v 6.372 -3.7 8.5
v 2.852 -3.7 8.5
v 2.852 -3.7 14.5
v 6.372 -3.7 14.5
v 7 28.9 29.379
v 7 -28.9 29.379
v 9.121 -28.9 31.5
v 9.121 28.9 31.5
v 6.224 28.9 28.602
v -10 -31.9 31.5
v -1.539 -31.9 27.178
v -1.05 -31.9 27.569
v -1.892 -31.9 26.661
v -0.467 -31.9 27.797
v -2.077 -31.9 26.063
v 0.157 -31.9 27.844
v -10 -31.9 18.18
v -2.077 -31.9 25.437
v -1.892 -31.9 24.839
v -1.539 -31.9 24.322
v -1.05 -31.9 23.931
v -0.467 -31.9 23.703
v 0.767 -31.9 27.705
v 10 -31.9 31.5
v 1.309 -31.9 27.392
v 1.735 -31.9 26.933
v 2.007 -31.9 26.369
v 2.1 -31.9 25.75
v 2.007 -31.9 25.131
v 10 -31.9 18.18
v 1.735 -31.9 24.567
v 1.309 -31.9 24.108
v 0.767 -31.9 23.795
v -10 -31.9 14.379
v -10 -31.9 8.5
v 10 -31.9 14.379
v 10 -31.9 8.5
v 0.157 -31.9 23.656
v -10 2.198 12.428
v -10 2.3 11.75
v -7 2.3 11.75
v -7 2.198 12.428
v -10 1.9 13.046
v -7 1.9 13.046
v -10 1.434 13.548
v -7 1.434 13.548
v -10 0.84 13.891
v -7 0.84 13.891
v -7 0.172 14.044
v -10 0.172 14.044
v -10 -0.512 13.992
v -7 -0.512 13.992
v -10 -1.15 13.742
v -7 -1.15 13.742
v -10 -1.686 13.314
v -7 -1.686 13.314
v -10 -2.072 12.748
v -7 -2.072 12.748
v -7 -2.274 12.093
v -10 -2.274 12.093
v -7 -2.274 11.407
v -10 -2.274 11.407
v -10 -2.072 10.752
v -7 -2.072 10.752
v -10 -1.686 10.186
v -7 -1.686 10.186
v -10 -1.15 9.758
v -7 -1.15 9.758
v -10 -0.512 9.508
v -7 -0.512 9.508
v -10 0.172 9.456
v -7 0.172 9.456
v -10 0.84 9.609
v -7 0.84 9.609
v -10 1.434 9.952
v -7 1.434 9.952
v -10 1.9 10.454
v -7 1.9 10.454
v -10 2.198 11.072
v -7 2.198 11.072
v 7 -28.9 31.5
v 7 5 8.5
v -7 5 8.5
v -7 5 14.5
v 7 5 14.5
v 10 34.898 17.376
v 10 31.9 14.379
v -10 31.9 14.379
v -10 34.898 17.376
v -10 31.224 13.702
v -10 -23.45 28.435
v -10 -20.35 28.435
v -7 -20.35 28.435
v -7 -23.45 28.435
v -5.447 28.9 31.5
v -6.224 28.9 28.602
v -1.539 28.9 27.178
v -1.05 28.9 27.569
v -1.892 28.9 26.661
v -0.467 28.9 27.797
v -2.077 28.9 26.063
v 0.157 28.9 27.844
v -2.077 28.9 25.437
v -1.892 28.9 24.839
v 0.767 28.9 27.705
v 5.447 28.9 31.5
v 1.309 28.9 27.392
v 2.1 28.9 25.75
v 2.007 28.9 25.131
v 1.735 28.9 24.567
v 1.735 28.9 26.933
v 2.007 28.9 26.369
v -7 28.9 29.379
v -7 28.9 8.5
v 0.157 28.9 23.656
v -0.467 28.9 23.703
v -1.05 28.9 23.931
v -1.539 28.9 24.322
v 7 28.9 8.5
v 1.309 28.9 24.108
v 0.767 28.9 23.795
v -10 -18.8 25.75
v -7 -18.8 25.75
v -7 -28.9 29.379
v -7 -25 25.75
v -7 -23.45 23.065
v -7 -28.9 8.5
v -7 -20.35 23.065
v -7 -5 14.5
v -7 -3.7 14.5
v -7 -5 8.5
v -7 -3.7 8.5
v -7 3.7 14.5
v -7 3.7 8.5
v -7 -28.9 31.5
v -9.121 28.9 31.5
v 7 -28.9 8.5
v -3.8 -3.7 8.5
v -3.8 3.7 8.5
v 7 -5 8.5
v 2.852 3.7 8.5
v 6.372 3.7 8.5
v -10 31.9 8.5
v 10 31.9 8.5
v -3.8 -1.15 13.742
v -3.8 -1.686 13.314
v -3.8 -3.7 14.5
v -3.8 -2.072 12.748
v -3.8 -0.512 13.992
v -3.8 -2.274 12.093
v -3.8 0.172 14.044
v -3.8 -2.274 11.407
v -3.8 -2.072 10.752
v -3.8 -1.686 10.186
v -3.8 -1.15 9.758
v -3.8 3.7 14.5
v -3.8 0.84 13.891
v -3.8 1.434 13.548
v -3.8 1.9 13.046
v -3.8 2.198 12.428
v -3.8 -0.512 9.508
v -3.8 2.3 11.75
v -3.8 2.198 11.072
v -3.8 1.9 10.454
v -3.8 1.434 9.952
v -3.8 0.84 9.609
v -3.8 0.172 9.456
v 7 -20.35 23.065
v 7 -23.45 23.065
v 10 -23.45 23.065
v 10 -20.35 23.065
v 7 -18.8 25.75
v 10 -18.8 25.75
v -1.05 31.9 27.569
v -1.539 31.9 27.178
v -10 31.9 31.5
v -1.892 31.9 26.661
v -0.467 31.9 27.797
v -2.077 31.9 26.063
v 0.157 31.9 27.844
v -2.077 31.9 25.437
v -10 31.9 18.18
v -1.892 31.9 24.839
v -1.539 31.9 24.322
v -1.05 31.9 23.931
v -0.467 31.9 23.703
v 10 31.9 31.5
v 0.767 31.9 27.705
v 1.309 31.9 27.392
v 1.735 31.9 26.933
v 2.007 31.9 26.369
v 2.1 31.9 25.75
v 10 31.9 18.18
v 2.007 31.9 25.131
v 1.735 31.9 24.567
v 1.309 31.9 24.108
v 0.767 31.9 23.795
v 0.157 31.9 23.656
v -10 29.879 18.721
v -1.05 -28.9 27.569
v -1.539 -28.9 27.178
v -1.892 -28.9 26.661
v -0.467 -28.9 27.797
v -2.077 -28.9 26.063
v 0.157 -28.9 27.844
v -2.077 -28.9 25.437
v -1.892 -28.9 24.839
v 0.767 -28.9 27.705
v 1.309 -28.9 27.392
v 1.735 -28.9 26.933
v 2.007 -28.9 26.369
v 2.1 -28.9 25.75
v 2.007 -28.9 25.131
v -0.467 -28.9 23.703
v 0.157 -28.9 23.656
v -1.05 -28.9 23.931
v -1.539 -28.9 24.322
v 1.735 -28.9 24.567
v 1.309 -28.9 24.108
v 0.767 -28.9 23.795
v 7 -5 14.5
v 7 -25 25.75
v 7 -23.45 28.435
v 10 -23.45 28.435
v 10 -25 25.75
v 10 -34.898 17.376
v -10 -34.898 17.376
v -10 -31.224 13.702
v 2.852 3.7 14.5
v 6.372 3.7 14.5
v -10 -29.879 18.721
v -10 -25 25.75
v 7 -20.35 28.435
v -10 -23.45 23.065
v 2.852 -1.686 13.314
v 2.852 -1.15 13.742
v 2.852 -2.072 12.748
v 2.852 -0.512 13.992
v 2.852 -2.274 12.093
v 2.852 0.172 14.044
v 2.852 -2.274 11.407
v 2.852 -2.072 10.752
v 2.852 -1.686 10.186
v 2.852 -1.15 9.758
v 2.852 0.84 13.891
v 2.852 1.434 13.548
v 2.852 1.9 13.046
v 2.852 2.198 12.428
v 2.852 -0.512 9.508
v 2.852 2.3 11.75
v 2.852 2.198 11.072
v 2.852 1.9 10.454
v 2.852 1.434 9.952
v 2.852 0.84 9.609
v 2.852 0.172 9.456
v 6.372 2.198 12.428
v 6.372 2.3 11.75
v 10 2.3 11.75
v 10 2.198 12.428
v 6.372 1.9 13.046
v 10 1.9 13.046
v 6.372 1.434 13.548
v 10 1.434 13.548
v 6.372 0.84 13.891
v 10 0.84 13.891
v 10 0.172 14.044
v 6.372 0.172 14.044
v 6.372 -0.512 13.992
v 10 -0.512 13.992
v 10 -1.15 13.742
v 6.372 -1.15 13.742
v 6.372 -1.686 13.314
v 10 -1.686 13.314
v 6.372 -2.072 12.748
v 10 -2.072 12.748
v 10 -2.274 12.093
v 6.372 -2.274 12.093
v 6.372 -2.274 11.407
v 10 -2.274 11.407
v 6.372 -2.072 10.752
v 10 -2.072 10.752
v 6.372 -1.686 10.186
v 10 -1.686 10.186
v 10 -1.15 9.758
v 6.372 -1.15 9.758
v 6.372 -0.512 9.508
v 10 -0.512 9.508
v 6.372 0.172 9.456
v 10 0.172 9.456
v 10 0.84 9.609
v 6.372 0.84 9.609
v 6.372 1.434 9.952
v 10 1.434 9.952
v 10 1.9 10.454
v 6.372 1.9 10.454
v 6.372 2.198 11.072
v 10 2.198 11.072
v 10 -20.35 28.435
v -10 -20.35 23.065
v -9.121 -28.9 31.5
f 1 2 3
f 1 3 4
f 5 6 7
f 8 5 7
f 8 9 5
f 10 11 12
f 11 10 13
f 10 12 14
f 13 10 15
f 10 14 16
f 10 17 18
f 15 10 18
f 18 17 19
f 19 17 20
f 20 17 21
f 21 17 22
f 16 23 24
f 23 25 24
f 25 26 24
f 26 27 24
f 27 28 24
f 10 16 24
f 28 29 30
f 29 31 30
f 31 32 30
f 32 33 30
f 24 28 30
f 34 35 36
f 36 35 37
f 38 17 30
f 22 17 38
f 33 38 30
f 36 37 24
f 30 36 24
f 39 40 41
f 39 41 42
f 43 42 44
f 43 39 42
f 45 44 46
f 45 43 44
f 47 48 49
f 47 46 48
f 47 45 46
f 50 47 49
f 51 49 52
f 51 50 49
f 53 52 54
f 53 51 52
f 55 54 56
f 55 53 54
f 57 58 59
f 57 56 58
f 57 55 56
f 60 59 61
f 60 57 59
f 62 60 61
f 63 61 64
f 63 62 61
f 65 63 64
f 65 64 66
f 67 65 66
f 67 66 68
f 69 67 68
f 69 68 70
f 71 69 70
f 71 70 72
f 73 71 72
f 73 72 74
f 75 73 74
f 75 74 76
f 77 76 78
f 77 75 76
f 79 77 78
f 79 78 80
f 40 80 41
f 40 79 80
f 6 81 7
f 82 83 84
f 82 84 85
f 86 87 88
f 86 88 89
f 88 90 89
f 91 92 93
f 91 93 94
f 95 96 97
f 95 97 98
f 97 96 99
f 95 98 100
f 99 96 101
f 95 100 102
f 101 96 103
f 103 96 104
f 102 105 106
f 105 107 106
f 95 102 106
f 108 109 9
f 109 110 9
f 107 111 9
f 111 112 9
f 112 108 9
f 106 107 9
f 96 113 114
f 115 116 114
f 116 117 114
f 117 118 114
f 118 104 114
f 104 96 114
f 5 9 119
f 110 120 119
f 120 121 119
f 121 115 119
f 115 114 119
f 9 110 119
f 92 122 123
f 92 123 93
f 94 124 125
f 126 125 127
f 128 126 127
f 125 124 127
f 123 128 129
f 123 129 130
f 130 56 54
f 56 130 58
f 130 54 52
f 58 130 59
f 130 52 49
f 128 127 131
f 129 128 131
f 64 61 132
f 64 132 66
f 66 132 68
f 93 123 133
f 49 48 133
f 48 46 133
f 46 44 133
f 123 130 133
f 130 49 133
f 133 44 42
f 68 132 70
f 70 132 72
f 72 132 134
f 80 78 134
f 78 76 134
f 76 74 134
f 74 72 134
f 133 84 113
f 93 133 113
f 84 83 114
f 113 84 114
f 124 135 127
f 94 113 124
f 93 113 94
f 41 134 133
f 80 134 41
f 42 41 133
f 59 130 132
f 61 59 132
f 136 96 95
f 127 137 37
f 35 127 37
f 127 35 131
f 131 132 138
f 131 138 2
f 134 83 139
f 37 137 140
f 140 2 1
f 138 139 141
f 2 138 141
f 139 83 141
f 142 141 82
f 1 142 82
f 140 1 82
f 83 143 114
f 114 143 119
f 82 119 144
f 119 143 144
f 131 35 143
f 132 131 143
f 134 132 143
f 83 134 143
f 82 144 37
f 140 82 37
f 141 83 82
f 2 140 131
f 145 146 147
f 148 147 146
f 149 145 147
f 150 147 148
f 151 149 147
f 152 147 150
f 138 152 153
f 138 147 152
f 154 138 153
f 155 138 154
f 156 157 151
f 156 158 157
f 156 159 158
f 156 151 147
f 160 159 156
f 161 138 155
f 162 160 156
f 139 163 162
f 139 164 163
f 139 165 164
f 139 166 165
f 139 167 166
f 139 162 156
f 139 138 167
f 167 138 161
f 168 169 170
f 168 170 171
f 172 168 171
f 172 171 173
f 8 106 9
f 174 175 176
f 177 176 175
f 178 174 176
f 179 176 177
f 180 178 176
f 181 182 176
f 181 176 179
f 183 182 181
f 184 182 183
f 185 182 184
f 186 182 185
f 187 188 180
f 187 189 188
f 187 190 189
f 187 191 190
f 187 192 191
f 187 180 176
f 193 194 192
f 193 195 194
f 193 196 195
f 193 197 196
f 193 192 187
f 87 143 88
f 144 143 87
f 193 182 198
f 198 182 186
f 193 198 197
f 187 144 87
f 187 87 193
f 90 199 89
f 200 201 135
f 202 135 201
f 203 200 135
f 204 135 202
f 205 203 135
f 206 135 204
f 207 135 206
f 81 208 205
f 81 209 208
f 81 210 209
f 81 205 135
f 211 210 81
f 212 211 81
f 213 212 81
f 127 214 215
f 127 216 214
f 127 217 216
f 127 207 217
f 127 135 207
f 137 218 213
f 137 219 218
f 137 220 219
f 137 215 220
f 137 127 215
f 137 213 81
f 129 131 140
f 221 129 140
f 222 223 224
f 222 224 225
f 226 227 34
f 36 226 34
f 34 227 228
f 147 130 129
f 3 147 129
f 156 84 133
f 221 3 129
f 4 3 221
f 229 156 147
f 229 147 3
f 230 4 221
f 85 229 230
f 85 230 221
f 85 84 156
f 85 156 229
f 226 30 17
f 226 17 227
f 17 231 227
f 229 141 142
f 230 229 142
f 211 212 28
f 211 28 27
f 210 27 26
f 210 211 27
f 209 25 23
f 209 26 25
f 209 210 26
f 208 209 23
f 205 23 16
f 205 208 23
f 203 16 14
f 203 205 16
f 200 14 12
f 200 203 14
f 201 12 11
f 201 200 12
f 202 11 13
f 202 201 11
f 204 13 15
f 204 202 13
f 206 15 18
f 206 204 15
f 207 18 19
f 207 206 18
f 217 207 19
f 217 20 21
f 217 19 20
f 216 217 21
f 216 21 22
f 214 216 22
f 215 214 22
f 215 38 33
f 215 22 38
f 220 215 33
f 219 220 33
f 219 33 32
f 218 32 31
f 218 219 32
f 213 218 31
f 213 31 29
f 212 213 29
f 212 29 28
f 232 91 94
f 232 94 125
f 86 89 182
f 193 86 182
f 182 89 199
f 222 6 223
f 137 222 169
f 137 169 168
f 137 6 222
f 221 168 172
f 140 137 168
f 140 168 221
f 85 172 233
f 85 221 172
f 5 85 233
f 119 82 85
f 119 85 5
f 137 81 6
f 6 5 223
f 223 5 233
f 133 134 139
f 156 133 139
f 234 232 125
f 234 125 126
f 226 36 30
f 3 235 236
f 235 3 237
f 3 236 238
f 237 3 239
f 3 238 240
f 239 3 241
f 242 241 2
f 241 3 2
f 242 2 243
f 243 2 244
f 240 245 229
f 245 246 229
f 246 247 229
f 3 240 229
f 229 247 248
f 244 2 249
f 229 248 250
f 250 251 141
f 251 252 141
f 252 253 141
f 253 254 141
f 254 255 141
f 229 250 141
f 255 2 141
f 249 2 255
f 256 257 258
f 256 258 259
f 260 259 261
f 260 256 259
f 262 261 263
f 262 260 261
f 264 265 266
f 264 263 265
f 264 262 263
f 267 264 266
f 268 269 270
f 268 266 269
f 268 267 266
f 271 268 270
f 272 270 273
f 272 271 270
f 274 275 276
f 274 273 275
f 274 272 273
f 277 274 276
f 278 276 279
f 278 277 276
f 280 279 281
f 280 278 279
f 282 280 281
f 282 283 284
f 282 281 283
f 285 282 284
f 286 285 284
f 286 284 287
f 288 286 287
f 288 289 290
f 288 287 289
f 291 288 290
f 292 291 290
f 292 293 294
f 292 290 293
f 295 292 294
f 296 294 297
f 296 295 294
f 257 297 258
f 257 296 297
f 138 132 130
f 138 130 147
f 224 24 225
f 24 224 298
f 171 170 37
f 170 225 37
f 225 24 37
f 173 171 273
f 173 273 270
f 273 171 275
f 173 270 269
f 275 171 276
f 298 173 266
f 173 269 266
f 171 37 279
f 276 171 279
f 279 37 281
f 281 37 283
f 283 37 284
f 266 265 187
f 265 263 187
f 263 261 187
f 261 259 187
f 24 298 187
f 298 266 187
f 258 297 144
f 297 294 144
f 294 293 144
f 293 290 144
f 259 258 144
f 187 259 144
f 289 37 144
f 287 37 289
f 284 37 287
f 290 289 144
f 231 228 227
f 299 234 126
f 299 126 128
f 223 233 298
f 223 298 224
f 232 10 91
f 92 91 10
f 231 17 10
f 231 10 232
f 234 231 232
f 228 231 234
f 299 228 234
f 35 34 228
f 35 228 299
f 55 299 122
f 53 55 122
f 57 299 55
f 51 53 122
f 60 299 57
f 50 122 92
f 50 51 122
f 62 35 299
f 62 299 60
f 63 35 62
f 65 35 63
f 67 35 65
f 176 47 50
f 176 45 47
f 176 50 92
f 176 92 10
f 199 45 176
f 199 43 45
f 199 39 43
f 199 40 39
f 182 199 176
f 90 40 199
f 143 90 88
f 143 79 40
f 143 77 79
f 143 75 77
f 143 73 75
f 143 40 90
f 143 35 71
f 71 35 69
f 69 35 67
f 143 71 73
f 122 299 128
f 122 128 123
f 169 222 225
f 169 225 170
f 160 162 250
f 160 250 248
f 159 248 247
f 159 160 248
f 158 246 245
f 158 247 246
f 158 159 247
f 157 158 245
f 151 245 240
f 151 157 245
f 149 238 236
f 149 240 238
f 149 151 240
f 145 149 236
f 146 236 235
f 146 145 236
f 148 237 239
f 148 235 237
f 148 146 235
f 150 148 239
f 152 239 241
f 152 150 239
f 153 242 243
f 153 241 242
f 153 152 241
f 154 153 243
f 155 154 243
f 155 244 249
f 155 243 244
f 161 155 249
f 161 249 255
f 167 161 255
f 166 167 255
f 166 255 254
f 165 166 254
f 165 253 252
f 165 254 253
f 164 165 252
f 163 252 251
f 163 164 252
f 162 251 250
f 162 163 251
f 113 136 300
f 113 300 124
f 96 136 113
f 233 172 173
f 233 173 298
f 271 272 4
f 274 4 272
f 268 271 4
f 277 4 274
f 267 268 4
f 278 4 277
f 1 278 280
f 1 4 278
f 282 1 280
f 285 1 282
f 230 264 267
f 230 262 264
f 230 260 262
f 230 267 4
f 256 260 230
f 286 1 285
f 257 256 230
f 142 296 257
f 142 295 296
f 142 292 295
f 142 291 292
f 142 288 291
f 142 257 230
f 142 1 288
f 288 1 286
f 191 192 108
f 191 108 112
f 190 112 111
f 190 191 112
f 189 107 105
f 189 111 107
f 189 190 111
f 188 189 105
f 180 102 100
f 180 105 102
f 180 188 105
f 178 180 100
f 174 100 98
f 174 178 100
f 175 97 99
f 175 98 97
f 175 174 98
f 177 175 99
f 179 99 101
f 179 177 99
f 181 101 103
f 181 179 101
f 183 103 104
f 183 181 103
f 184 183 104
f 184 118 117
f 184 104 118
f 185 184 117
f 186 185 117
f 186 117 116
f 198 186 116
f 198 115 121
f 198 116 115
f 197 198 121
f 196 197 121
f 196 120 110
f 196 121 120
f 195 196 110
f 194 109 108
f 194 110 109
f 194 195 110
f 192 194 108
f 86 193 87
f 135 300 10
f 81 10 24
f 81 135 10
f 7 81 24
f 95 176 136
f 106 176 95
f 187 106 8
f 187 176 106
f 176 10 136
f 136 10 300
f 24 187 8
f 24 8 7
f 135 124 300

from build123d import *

# Parameters (mm, degrees)
CUBE013_W                = 3.2
CUBE013_H                = 7.4
CUBE013_DEPTH            = 6
CUBE014_W                = 3.52
CUBE014_H                = 7.4
CUBE014_DEPTH            = 6
CYLINDER009_R            = 2.3
CYLINDER009_DEPTH        = 71
CUBE012_W                = 14
CUBE012_H                = 10
CUBE012_DEPTH            = 6
CYLINDER007_R            = 2.3
CYLINDER007_DEPTH        = 71
CYLINDER008_R            = 2.1
CYLINDER008_DEPTH        = 71
PRISM006_DEPTH           = 57.8
PRISM006_ROLL_ANGLE      = 90
PRISM006_PITCH_ANGLE     = -14.999996
PRISM007_DEPTH           = 57.8
PRISM007_ROLL_ANGLE      = -90
PRISM007_PITCH_ANGLE     = -14.999996
PRISM007_PLACEMENT_ANGLE = -180
PRISM008_DEPTH           = 21
CUBE011_W                = 14
CUBE011_H                = 57.8
CUBE011_DEPTH            = 23
PRISM004_DEPTH           = 20
PRISM004_ROLL_ANGLE      = 90
PRISM004_PITCH_ANGLE     = -14.999988
PRISM004_PLACEMENT_ANGLE = 90
PRISM005_DEPTH           = 20
PRISM005_ROLL_ANGLE      = -90
PRISM005_PITCH_ANGLE     = -14.999988
PRISM005_PLACEMENT_ANGLE = -90
CUBE010_W                = 20
CUBE010_H                = 63.8
CUBE010_DEPTH            = 23


with BuildPart() as cube013:
    # cube013 → cube013 (new body)
    with BuildSketch(Plane(origin=(-7, -3.7, 8.5), x_dir=(1, 0, 0), z_dir=(0, 0, 1))):
        with Locations((1.6, 3.7)):
            Rectangle(CUBE013_W, CUBE013_H)
    extrude(amount=CUBE013_DEPTH)


with BuildPart() as cube014:
    # cube014 → cube014 (new body)
    with BuildSketch(Plane(origin=(2.85194, -3.7, 8.5), x_dir=(1, 0, 0), z_dir=(0, 0, 1))):
        with Locations((1.76, 3.7)):
            Rectangle(CUBE014_W, CUBE014_H)
    extrude(amount=CUBE014_DEPTH)


with BuildPart() as group005:
    # cylinder009 → cylinder009 (new body)
    with BuildSketch(Plane(origin=(-35.5, 0, 11.75), x_dir=(0, 1, 0), z_dir=(1, 0, 0))):
        Circle(CYLINDER009_R)
    extrude(amount=CYLINDER009_DEPTH)

    # Group005: union cube013, cube014
    add(cube013.part)
    add(cube014.part)


with BuildPart() as body003:
    # cube012 → cube012 (new body)
    with BuildSketch(Plane(origin=(-7, -5, 8.5), x_dir=(1, 0, 0), z_dir=(0, 0, 1))):
        with Locations((7, 5)):
            Rectangle(CUBE012_W, CUBE012_H)
    extrude(amount=CUBE012_DEPTH)

    # difference003: cut Group005
    add(group005.part, mode=Mode.SUBTRACT)


with BuildPart() as cylinder007:
    # cylinder007 → cylinder007 (new body)
    with BuildSketch(Plane(origin=(-35.5, 0, 11.75), x_dir=(0, 1, 0), z_dir=(1, 0, 0))):
        Circle(CYLINDER007_R)
    extrude(amount=CYLINDER007_DEPTH)


with BuildPart() as cylinder008:
    # cylinder008 → cylinder008 (new body)
    with BuildSketch(Plane(origin=(0, 35.5, 25.75), x_dir=(1, 0, 0), z_dir=(0, -1, 0))):
        Circle(CYLINDER008_R)
    extrude(amount=CYLINDER008_DEPTH)


with BuildPart() as prism006:
    # prism006 → prism006 (new body)
    with BuildSketch(Plane.XY):
        Polygon((3, 0), (-1.5, 2.598076), (-1.5, -2.598076), align=None)
    extrude(amount=PRISM006_DEPTH)


with BuildPart() as prism006_1:
    # prism006 roll: moved
    add(prism006.part.rotate(Axis((0, 0, 0), (1, 0, 0)), PRISM006_ROLL_ANGLE))


with BuildPart() as prism006_2:
    # prism006 pitch: moved
    add(prism006_1.part.rotate(Axis((0, 0, 0), (0, 1, 0)), PRISM006_PITCH_ANGLE))


with BuildPart() as prism006_3:
    # prism006 placement: moved
    add(prism006_2.part.moved(Location((7, 28.900002, 31.5))))


with BuildPart() as prism007:
    # prism007 → prism007 (new body)
    with BuildSketch(Plane.XY):
        Polygon((3, 0), (-1.5, 2.598076), (-1.5, -2.598076), align=None)
    extrude(amount=PRISM007_DEPTH)


with BuildPart() as prism007_1:
    # prism007 roll: moved
    add(prism007.part.rotate(Axis((0, 0, 0), (1, 0, 0)), PRISM007_ROLL_ANGLE))


with BuildPart() as prism007_2:
    # prism007 pitch: moved
    add(prism007_1.part.rotate(Axis((0, 0, 0), (0, 1, 0)), PRISM007_PITCH_ANGLE))


with BuildPart() as prism007_3:
    # prism007 placement: moved
    add(prism007_2.part.moved(Location((-7, 28.900002, 31.5))).rotate(Axis((-7, 28.900002, 31.5), (0, 0, 1)), PRISM007_PLACEMENT_ANGLE))


with BuildPart() as prism008:
    # prism008 → prism008 (new body)
    with BuildSketch(Plane(origin=(-10.5, -21.9, 25.75), x_dir=(0, 1, 0), z_dir=(1, 0, 0))):
        Polygon((3.1, 0), (1.55, 2.684679), (-1.55, 2.684679), (-3.1, 0), (-1.55, -2.684679), (1.55, -2.684679), align=None)
    extrude(amount=PRISM008_DEPTH)


with BuildPart() as group004:
    # cube011 → cube011 (new body)
    with BuildSketch(Plane(origin=(-7, -28.9, 8.5), x_dir=(1, 0, 0), z_dir=(0, 0, 1))):
        with Locations((7, 28.9)):
            Rectangle(CUBE011_W, CUBE011_H)
    extrude(amount=CUBE011_DEPTH)

    # Group004: union cylinder007, cylinder008, prism006, prism007, prism008
    add(cylinder007.part)
    add(cylinder008.part)
    add(prism006_3.part)
    add(prism007_3.part)
    add(prism008.part)


with BuildPart() as prism004:
    # prism004 → prism004 (new body)
    with BuildSketch(Plane.XY):
        Polygon((3, 0), (-1.5, 2.598076), (-1.5, -2.598076), align=None)
    extrude(amount=PRISM004_DEPTH)


with BuildPart() as prism004_1:
    # prism004 roll: moved
    add(prism004.part.rotate(Axis((0, 0, 0), (1, 0, 0)), PRISM004_ROLL_ANGLE))


with BuildPart() as prism004_2:
    # prism004 pitch: moved
    add(prism004_1.part.rotate(Axis((0, 0, 0), (0, 1, 0)), PRISM004_PITCH_ANGLE))


with BuildPart() as prism004_3:
    # prism004 placement: moved
    add(prism004_2.part.moved(Location((-10.000001, 32, 16.6))).rotate(Axis((-10.000001, 32, 16.6), (0, 0, 1)), PRISM004_PLACEMENT_ANGLE))


with BuildPart() as prism005:
    # prism005 → prism005 (new body)
    with BuildSketch(Plane.XY):
        Polygon((3, 0), (-1.5, 2.598076), (-1.5, -2.598076), align=None)
    extrude(amount=PRISM005_DEPTH)


with BuildPart() as prism005_1:
    # prism005 roll: moved
    add(prism005.part.rotate(Axis((0, 0, 0), (1, 0, 0)), PRISM005_ROLL_ANGLE))


with BuildPart() as prism005_2:
    # prism005 pitch: moved
    add(prism005_1.part.rotate(Axis((0, 0, 0), (0, 1, 0)), PRISM005_PITCH_ANGLE))


with BuildPart() as prism005_3:
    # prism005 placement: moved
    add(prism005_2.part.moved(Location((-10.000001, -32, 16.6))).rotate(Axis((-10.000001, -32, 16.6), (0, 0, 1)), PRISM005_PLACEMENT_ANGLE))


with BuildPart() as bottom_slider:
    # cube010 → cube010 (new body)
    with BuildSketch(Plane(origin=(-10, -31.9, 8.5), x_dir=(1, 0, 0), z_dir=(0, 0, 1))):
        with Locations((10, 31.9)):
            Rectangle(CUBE010_W, CUBE010_H)
    extrude(amount=CUBE010_DEPTH)

    # Group003: union prism004, prism005
    add(prism004_3.part)
    add(prism005_3.part)

    # difference002: cut Group004
    add(group004.part, mode=Mode.SUBTRACT)

    # Fusion: union Body003
    add(body003.part)


solid = bottom_slider.part
